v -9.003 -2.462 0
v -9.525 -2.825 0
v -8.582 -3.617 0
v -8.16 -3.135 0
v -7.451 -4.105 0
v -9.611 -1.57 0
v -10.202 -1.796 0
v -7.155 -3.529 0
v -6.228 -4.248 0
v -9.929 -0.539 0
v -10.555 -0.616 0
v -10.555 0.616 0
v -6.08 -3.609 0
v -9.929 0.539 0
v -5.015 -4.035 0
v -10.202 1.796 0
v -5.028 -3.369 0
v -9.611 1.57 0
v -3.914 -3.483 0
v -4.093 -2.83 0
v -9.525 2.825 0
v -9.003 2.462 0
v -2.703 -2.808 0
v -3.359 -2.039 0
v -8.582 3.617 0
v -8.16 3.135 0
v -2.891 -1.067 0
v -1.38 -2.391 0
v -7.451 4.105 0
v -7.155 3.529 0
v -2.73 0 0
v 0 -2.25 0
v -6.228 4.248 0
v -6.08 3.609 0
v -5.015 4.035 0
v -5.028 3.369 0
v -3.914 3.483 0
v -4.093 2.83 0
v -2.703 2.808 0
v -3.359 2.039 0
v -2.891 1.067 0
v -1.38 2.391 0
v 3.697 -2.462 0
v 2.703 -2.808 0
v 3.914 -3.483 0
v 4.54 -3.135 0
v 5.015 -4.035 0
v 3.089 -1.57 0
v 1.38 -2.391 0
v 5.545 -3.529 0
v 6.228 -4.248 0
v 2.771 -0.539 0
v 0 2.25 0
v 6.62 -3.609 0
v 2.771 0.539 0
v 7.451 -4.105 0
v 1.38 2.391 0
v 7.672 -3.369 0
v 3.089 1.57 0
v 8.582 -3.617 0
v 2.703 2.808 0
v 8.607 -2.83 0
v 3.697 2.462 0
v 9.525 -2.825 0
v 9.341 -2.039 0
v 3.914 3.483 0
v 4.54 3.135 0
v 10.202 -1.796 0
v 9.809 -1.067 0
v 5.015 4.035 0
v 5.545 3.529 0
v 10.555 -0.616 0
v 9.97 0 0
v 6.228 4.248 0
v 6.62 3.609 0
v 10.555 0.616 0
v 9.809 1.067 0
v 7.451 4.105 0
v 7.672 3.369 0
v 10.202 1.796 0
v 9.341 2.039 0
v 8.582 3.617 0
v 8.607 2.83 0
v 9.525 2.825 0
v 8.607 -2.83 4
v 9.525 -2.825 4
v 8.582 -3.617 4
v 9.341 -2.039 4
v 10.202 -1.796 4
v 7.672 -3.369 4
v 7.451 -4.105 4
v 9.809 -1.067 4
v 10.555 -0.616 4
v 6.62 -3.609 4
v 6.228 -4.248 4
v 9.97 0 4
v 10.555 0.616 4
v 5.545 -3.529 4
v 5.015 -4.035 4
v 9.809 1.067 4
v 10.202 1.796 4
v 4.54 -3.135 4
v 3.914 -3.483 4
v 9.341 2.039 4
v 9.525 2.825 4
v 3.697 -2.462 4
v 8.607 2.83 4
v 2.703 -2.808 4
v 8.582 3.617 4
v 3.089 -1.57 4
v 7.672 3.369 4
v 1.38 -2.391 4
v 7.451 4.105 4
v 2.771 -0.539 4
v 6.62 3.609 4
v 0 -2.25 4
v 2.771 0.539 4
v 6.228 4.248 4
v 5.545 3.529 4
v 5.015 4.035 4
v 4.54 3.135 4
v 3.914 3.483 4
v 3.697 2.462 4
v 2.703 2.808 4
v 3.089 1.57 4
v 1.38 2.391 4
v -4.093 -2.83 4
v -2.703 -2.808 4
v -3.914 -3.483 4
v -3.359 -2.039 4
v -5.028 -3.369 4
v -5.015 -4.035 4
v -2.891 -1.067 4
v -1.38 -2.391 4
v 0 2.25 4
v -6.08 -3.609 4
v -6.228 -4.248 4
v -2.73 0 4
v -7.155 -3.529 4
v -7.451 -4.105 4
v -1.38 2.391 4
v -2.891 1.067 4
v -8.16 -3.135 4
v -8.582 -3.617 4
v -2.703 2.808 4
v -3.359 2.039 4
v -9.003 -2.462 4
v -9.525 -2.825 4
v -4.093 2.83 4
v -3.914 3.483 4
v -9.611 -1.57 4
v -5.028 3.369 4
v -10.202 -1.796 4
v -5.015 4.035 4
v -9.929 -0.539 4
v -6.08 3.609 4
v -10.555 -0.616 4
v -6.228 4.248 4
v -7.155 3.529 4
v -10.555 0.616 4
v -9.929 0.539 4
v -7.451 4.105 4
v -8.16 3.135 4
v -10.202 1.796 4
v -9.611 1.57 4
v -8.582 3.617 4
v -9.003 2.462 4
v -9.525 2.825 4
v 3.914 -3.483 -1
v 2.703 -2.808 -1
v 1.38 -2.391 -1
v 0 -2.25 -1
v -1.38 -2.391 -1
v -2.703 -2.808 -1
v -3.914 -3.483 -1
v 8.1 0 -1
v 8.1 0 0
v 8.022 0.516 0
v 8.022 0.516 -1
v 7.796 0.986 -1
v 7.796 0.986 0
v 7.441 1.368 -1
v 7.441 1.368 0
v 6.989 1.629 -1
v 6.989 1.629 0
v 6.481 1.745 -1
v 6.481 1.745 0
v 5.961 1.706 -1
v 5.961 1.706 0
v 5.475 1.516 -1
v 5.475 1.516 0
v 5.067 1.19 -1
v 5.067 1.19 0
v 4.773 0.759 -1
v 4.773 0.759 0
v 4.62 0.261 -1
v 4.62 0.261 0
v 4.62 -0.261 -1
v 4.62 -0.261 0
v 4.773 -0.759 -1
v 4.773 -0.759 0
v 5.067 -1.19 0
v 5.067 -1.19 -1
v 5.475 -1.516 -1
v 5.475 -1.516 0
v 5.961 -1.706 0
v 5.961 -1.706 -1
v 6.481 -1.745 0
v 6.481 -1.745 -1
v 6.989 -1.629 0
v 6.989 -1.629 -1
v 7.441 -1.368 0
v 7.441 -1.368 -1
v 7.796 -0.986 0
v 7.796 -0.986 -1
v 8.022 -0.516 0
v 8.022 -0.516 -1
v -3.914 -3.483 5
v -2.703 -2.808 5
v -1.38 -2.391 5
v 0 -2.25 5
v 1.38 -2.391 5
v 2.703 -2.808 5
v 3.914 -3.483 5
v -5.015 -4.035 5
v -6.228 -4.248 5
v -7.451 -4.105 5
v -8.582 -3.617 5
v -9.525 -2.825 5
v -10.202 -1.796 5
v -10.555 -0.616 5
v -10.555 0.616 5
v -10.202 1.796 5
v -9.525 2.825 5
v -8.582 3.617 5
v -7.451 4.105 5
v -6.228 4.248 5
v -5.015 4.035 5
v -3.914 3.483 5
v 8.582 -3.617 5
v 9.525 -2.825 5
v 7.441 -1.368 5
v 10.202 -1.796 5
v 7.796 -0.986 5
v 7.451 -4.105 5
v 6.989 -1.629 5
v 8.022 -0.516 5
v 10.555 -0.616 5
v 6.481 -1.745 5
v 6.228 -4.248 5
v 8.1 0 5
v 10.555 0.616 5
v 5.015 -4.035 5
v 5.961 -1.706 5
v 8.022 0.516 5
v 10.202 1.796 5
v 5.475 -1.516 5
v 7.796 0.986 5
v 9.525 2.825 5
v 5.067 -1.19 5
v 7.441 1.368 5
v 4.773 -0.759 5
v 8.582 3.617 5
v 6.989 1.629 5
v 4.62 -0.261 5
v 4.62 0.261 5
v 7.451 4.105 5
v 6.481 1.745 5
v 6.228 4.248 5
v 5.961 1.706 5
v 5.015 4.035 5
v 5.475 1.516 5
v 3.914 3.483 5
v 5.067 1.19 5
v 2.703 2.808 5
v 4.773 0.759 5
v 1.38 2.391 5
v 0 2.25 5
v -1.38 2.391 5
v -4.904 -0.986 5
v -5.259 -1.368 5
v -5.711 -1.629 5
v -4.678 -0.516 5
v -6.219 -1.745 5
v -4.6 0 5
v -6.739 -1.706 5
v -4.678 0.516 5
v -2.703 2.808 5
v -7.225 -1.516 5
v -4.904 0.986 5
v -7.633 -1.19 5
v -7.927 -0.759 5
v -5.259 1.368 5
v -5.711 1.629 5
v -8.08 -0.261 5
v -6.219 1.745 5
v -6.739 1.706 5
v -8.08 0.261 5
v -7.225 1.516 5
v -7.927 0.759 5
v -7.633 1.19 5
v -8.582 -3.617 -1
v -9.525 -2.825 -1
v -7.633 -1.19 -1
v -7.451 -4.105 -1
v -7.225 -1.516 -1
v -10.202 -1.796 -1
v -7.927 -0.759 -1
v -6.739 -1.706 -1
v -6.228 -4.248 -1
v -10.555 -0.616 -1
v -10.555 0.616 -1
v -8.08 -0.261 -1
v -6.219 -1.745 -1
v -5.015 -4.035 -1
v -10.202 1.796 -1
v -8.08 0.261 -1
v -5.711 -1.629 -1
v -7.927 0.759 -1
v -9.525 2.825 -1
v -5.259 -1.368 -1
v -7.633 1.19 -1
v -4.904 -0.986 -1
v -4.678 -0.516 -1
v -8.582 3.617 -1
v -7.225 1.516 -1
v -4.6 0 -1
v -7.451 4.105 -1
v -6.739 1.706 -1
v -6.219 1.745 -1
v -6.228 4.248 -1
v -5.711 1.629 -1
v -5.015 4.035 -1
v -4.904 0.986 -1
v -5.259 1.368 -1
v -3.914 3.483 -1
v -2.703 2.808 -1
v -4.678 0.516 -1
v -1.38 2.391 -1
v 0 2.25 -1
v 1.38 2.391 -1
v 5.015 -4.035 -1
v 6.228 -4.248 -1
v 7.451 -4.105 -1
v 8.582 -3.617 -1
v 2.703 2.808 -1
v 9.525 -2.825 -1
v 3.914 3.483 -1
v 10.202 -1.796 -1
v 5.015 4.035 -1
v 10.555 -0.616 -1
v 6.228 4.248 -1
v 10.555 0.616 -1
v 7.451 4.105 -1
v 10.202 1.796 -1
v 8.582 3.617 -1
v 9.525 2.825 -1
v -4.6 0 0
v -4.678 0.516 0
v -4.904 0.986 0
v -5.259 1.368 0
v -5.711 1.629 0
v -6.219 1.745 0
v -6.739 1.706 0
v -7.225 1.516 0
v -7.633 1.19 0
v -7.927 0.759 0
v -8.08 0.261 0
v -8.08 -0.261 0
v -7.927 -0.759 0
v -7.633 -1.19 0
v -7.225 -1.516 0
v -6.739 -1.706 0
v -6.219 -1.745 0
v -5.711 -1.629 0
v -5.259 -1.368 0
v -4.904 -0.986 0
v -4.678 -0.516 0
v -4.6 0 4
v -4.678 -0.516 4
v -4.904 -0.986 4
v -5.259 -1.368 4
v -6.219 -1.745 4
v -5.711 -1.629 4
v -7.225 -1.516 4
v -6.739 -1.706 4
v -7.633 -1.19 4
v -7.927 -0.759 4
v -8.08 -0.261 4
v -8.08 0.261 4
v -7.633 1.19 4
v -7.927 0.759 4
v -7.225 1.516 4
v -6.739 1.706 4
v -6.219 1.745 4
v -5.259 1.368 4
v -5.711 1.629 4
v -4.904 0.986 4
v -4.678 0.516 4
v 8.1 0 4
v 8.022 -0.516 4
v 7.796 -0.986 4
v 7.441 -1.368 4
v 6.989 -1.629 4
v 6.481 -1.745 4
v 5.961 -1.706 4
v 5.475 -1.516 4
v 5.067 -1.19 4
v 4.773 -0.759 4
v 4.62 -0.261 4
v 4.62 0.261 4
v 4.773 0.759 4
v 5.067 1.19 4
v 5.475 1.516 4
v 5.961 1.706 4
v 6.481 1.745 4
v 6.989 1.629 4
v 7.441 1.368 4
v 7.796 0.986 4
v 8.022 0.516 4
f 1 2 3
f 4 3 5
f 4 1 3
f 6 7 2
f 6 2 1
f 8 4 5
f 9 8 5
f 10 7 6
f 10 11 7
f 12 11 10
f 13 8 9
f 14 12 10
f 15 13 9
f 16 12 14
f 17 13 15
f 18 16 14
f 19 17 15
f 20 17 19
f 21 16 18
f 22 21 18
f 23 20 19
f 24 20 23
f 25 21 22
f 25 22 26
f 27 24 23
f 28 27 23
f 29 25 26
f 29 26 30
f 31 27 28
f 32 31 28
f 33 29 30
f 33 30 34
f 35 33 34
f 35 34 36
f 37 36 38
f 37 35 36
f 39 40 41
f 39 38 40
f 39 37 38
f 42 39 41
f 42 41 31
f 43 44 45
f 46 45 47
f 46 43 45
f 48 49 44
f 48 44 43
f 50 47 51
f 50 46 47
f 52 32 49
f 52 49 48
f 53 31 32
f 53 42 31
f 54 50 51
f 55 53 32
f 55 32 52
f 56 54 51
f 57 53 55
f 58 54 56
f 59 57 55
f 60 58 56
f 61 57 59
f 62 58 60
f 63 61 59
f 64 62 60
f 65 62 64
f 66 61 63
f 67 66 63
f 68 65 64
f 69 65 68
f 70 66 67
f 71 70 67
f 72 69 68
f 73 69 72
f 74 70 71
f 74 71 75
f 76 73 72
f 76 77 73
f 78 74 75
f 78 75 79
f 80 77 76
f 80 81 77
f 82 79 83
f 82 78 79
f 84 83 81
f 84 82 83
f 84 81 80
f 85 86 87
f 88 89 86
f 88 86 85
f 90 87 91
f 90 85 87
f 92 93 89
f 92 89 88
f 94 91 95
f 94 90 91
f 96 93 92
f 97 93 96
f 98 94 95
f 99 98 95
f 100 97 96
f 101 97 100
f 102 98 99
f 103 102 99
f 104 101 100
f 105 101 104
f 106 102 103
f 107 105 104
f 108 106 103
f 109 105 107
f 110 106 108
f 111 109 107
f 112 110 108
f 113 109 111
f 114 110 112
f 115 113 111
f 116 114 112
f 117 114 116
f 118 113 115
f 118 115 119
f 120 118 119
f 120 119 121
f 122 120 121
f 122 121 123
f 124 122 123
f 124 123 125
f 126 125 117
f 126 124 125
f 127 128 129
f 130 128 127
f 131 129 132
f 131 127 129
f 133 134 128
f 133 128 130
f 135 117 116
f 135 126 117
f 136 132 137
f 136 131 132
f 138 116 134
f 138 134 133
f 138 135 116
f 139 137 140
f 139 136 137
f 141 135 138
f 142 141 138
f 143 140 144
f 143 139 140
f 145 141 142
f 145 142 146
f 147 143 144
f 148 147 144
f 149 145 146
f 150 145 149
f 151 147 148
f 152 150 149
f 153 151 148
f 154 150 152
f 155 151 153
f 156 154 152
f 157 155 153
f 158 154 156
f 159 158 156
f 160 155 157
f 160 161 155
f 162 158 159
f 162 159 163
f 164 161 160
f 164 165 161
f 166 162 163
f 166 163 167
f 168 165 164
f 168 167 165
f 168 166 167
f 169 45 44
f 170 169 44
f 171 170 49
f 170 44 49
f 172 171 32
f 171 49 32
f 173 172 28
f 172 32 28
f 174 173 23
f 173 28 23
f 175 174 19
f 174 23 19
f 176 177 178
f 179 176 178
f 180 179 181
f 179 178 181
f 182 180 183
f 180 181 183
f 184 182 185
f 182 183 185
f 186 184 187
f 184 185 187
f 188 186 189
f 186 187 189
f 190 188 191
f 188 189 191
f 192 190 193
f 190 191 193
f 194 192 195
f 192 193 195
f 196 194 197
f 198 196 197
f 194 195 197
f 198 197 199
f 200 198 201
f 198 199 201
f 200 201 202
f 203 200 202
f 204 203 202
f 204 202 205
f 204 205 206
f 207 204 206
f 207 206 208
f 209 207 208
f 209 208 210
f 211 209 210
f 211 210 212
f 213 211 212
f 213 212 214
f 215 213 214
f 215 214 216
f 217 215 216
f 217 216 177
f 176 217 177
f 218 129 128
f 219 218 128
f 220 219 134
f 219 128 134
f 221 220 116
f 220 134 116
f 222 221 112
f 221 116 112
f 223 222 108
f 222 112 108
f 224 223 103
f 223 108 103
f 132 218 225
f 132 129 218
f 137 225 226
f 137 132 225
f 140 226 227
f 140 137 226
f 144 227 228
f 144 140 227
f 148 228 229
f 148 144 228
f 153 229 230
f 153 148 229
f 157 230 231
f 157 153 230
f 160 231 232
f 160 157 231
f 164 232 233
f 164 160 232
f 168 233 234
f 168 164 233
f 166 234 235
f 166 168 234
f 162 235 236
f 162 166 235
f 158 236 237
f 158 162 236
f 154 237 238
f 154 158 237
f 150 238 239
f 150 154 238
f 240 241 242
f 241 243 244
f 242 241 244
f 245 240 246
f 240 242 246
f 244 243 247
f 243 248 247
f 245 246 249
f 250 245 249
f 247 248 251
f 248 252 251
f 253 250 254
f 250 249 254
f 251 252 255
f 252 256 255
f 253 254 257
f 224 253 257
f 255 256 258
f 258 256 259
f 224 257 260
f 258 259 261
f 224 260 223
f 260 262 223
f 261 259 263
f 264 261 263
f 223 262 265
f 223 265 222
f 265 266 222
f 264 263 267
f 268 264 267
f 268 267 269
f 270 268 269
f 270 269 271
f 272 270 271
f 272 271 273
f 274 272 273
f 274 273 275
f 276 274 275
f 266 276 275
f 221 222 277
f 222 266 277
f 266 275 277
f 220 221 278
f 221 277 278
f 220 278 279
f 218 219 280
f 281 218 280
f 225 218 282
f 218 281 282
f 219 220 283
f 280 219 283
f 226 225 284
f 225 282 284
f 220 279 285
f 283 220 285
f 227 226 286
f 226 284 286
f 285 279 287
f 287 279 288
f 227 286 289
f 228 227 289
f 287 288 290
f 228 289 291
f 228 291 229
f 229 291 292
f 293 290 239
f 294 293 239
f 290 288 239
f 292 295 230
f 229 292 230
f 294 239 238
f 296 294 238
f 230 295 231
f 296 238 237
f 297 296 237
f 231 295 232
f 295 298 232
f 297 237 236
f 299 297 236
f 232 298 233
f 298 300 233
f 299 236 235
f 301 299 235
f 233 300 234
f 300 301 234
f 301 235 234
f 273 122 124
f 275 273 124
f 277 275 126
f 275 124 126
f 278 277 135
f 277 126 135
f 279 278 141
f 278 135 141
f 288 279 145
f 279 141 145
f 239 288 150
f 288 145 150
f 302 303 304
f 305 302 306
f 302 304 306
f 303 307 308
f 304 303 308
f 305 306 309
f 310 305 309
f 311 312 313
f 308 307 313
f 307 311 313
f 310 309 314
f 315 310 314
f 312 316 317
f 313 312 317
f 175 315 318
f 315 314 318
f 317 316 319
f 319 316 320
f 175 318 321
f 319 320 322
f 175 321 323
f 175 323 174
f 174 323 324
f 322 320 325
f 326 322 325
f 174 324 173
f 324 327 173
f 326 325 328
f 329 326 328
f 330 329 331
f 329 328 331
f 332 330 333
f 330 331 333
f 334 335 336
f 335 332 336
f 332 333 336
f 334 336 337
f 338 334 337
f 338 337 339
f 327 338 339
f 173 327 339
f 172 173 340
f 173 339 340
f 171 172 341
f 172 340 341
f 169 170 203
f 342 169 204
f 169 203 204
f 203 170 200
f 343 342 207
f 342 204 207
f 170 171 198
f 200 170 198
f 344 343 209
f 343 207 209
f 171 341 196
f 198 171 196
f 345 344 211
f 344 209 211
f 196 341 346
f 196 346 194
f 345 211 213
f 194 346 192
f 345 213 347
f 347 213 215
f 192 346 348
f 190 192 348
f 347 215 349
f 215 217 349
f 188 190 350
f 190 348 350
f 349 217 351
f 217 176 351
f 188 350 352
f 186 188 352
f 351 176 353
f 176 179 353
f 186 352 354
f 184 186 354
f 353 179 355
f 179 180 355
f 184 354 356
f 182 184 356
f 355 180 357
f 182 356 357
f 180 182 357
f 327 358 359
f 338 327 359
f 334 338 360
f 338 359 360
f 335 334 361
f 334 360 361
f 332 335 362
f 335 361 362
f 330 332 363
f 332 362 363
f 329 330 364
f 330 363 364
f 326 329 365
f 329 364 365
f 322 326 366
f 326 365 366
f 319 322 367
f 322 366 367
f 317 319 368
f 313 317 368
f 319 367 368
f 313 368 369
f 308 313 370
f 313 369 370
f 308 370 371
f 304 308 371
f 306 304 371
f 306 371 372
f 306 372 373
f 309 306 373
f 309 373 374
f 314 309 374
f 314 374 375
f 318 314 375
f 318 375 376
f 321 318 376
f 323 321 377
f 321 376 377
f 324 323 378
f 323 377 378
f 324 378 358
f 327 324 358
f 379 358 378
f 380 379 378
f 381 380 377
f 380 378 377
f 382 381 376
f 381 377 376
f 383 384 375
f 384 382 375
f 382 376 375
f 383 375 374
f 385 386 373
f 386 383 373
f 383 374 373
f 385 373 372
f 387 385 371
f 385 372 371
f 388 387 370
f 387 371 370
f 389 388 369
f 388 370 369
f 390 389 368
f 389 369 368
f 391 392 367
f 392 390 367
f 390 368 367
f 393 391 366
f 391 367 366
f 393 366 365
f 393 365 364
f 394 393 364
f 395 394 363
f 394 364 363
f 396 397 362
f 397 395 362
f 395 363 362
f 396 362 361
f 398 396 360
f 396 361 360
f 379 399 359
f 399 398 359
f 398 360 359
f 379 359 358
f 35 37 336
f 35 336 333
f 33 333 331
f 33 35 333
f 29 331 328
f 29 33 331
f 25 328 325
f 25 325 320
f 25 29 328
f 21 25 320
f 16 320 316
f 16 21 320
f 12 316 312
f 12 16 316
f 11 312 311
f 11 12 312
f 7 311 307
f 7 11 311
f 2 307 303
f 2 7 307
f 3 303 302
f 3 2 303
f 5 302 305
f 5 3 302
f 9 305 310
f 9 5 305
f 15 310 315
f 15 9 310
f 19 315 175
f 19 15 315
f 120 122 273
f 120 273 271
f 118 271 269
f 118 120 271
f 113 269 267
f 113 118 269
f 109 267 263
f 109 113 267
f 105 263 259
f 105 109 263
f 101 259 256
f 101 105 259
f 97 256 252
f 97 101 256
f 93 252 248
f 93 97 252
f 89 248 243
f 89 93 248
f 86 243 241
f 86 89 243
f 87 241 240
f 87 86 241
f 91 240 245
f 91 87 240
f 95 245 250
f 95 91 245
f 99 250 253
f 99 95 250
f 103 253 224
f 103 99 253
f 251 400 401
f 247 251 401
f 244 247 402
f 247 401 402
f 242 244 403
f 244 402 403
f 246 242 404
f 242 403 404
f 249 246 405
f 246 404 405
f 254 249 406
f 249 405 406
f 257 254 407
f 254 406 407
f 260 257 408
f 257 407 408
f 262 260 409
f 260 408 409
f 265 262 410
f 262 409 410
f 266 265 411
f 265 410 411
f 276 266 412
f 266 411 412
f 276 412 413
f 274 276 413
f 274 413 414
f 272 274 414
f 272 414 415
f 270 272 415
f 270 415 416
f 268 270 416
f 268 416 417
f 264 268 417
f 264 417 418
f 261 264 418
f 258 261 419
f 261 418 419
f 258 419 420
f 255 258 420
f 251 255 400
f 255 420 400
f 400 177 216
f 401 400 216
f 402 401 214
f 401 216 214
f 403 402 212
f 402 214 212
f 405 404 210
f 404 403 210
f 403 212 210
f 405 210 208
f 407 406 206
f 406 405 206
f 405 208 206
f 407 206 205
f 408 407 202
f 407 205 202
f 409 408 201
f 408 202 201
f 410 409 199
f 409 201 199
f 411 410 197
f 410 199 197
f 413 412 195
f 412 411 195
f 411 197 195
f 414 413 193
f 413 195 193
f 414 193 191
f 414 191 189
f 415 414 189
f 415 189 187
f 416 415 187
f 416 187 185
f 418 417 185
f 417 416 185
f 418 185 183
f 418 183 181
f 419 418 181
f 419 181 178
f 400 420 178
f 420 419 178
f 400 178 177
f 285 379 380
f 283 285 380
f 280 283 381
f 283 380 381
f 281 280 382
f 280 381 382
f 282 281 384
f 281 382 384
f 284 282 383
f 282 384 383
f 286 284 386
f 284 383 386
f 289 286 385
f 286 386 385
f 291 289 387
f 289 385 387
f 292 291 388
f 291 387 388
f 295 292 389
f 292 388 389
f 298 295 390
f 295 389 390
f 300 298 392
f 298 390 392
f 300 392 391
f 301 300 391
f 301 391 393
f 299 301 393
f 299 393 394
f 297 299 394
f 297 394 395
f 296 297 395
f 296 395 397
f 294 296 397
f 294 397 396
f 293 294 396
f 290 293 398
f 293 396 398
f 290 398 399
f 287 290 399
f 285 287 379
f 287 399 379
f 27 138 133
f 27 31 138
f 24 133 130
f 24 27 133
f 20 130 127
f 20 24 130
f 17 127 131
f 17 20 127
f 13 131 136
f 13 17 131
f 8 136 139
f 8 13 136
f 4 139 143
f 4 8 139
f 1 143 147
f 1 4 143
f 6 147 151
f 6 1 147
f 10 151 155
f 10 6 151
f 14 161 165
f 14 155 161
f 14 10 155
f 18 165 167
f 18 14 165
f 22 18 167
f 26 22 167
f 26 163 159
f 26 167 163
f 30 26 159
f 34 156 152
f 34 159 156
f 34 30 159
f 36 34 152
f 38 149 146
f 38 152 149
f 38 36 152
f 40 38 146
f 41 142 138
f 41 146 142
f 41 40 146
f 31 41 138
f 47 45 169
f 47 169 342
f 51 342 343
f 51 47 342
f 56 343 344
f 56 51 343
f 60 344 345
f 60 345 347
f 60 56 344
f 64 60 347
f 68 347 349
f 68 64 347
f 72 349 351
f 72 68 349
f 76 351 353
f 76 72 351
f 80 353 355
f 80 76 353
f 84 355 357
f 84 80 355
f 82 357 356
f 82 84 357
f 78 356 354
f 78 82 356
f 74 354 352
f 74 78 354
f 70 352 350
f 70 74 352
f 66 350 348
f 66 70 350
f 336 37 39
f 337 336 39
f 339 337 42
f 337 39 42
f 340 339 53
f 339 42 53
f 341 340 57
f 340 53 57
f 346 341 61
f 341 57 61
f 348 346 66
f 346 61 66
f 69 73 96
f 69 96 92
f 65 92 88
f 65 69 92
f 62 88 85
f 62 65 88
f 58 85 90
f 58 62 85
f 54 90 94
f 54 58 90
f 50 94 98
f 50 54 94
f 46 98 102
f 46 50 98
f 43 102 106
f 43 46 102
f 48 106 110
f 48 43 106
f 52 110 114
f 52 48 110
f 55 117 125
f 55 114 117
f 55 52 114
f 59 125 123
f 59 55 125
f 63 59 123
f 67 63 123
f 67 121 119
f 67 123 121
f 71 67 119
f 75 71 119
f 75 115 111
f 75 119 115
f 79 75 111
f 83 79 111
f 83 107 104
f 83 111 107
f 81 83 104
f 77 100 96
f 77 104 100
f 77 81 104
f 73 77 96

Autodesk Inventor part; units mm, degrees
ref_plane "YZ Plane" through (0, 0, 0) normal (1, 0, 0) x (0, 1, 0)
sketch "Sketch1" plane through (0, 0, 0) normal (0, 0, 1) x (1, 0, 0)
  arc A0 (-3.9144, 3.4829) -> (-3.9144, -3.4829) centre (-6.35, 0) ccw
  arc A1 (3.9144, -3.4829) -> (3.9144, 3.4829) centre (6.35, 0) ccw
  line L0 (0, 0) -> (0, 6.6345) construction
  circle A2 centre (-6.35, 0) radius 3.6195
  line L1 (-6.35, -4.25) -> (6.35, -4.25) construction
  arc A3 (3.9144, -3.4829) -> (-3.9144, -3.4829) centre (0, -9.0806) ccw
  arc A4 (-3.9144, 3.4829) -> (3.9144, 3.4829) centre (0, 9.0806) ccw
  circle A5 centre (6.35, 0) radius 3.6195
  circle A6 centre (-6.35, 0) radius 1.75
  circle A7 centre (6.35, 0) radius 1.75
  point P0 (0, -2.25)
  point P1 (0, 2.25)
  point P2 (0, -2.25)
  dimension "d0" = 12.7
  dimension "d1" = 8.5
  dimension "d2" = 8.5
  dimension "d3" = 7.239
  dimension "d5" = 4.5
  dimension "d6" = 7.239
  dimension "d7" = 3.5
  dimension "d8" = 3.5
extrude "Extrusion1" add sketch "Sketch1" against normal blind 1 contours A4 A1 A3 A0 | A2 | A5
extrude "Extrusion2" add sketch "Sketch1" along normal blind 4 contours A2 | A5
ref_plane "Work Plane1" through (0, 0, 2) normal (0, 0, 1) x (1, 0, 0)
mirror "Mirror1" about plane through (0, 0, 2) normal (0, 0, 1) of "Extrusion1"
ref_plane "Work Plane2" through (0, 9.0806, 2) normal (0, 0, 1) x (1, 0, 0)
equation "\"d2\" = d1"
equation "\"d6\" = d3"
equation "\"d7\" = d8"
properties part number "Inner Chain"
